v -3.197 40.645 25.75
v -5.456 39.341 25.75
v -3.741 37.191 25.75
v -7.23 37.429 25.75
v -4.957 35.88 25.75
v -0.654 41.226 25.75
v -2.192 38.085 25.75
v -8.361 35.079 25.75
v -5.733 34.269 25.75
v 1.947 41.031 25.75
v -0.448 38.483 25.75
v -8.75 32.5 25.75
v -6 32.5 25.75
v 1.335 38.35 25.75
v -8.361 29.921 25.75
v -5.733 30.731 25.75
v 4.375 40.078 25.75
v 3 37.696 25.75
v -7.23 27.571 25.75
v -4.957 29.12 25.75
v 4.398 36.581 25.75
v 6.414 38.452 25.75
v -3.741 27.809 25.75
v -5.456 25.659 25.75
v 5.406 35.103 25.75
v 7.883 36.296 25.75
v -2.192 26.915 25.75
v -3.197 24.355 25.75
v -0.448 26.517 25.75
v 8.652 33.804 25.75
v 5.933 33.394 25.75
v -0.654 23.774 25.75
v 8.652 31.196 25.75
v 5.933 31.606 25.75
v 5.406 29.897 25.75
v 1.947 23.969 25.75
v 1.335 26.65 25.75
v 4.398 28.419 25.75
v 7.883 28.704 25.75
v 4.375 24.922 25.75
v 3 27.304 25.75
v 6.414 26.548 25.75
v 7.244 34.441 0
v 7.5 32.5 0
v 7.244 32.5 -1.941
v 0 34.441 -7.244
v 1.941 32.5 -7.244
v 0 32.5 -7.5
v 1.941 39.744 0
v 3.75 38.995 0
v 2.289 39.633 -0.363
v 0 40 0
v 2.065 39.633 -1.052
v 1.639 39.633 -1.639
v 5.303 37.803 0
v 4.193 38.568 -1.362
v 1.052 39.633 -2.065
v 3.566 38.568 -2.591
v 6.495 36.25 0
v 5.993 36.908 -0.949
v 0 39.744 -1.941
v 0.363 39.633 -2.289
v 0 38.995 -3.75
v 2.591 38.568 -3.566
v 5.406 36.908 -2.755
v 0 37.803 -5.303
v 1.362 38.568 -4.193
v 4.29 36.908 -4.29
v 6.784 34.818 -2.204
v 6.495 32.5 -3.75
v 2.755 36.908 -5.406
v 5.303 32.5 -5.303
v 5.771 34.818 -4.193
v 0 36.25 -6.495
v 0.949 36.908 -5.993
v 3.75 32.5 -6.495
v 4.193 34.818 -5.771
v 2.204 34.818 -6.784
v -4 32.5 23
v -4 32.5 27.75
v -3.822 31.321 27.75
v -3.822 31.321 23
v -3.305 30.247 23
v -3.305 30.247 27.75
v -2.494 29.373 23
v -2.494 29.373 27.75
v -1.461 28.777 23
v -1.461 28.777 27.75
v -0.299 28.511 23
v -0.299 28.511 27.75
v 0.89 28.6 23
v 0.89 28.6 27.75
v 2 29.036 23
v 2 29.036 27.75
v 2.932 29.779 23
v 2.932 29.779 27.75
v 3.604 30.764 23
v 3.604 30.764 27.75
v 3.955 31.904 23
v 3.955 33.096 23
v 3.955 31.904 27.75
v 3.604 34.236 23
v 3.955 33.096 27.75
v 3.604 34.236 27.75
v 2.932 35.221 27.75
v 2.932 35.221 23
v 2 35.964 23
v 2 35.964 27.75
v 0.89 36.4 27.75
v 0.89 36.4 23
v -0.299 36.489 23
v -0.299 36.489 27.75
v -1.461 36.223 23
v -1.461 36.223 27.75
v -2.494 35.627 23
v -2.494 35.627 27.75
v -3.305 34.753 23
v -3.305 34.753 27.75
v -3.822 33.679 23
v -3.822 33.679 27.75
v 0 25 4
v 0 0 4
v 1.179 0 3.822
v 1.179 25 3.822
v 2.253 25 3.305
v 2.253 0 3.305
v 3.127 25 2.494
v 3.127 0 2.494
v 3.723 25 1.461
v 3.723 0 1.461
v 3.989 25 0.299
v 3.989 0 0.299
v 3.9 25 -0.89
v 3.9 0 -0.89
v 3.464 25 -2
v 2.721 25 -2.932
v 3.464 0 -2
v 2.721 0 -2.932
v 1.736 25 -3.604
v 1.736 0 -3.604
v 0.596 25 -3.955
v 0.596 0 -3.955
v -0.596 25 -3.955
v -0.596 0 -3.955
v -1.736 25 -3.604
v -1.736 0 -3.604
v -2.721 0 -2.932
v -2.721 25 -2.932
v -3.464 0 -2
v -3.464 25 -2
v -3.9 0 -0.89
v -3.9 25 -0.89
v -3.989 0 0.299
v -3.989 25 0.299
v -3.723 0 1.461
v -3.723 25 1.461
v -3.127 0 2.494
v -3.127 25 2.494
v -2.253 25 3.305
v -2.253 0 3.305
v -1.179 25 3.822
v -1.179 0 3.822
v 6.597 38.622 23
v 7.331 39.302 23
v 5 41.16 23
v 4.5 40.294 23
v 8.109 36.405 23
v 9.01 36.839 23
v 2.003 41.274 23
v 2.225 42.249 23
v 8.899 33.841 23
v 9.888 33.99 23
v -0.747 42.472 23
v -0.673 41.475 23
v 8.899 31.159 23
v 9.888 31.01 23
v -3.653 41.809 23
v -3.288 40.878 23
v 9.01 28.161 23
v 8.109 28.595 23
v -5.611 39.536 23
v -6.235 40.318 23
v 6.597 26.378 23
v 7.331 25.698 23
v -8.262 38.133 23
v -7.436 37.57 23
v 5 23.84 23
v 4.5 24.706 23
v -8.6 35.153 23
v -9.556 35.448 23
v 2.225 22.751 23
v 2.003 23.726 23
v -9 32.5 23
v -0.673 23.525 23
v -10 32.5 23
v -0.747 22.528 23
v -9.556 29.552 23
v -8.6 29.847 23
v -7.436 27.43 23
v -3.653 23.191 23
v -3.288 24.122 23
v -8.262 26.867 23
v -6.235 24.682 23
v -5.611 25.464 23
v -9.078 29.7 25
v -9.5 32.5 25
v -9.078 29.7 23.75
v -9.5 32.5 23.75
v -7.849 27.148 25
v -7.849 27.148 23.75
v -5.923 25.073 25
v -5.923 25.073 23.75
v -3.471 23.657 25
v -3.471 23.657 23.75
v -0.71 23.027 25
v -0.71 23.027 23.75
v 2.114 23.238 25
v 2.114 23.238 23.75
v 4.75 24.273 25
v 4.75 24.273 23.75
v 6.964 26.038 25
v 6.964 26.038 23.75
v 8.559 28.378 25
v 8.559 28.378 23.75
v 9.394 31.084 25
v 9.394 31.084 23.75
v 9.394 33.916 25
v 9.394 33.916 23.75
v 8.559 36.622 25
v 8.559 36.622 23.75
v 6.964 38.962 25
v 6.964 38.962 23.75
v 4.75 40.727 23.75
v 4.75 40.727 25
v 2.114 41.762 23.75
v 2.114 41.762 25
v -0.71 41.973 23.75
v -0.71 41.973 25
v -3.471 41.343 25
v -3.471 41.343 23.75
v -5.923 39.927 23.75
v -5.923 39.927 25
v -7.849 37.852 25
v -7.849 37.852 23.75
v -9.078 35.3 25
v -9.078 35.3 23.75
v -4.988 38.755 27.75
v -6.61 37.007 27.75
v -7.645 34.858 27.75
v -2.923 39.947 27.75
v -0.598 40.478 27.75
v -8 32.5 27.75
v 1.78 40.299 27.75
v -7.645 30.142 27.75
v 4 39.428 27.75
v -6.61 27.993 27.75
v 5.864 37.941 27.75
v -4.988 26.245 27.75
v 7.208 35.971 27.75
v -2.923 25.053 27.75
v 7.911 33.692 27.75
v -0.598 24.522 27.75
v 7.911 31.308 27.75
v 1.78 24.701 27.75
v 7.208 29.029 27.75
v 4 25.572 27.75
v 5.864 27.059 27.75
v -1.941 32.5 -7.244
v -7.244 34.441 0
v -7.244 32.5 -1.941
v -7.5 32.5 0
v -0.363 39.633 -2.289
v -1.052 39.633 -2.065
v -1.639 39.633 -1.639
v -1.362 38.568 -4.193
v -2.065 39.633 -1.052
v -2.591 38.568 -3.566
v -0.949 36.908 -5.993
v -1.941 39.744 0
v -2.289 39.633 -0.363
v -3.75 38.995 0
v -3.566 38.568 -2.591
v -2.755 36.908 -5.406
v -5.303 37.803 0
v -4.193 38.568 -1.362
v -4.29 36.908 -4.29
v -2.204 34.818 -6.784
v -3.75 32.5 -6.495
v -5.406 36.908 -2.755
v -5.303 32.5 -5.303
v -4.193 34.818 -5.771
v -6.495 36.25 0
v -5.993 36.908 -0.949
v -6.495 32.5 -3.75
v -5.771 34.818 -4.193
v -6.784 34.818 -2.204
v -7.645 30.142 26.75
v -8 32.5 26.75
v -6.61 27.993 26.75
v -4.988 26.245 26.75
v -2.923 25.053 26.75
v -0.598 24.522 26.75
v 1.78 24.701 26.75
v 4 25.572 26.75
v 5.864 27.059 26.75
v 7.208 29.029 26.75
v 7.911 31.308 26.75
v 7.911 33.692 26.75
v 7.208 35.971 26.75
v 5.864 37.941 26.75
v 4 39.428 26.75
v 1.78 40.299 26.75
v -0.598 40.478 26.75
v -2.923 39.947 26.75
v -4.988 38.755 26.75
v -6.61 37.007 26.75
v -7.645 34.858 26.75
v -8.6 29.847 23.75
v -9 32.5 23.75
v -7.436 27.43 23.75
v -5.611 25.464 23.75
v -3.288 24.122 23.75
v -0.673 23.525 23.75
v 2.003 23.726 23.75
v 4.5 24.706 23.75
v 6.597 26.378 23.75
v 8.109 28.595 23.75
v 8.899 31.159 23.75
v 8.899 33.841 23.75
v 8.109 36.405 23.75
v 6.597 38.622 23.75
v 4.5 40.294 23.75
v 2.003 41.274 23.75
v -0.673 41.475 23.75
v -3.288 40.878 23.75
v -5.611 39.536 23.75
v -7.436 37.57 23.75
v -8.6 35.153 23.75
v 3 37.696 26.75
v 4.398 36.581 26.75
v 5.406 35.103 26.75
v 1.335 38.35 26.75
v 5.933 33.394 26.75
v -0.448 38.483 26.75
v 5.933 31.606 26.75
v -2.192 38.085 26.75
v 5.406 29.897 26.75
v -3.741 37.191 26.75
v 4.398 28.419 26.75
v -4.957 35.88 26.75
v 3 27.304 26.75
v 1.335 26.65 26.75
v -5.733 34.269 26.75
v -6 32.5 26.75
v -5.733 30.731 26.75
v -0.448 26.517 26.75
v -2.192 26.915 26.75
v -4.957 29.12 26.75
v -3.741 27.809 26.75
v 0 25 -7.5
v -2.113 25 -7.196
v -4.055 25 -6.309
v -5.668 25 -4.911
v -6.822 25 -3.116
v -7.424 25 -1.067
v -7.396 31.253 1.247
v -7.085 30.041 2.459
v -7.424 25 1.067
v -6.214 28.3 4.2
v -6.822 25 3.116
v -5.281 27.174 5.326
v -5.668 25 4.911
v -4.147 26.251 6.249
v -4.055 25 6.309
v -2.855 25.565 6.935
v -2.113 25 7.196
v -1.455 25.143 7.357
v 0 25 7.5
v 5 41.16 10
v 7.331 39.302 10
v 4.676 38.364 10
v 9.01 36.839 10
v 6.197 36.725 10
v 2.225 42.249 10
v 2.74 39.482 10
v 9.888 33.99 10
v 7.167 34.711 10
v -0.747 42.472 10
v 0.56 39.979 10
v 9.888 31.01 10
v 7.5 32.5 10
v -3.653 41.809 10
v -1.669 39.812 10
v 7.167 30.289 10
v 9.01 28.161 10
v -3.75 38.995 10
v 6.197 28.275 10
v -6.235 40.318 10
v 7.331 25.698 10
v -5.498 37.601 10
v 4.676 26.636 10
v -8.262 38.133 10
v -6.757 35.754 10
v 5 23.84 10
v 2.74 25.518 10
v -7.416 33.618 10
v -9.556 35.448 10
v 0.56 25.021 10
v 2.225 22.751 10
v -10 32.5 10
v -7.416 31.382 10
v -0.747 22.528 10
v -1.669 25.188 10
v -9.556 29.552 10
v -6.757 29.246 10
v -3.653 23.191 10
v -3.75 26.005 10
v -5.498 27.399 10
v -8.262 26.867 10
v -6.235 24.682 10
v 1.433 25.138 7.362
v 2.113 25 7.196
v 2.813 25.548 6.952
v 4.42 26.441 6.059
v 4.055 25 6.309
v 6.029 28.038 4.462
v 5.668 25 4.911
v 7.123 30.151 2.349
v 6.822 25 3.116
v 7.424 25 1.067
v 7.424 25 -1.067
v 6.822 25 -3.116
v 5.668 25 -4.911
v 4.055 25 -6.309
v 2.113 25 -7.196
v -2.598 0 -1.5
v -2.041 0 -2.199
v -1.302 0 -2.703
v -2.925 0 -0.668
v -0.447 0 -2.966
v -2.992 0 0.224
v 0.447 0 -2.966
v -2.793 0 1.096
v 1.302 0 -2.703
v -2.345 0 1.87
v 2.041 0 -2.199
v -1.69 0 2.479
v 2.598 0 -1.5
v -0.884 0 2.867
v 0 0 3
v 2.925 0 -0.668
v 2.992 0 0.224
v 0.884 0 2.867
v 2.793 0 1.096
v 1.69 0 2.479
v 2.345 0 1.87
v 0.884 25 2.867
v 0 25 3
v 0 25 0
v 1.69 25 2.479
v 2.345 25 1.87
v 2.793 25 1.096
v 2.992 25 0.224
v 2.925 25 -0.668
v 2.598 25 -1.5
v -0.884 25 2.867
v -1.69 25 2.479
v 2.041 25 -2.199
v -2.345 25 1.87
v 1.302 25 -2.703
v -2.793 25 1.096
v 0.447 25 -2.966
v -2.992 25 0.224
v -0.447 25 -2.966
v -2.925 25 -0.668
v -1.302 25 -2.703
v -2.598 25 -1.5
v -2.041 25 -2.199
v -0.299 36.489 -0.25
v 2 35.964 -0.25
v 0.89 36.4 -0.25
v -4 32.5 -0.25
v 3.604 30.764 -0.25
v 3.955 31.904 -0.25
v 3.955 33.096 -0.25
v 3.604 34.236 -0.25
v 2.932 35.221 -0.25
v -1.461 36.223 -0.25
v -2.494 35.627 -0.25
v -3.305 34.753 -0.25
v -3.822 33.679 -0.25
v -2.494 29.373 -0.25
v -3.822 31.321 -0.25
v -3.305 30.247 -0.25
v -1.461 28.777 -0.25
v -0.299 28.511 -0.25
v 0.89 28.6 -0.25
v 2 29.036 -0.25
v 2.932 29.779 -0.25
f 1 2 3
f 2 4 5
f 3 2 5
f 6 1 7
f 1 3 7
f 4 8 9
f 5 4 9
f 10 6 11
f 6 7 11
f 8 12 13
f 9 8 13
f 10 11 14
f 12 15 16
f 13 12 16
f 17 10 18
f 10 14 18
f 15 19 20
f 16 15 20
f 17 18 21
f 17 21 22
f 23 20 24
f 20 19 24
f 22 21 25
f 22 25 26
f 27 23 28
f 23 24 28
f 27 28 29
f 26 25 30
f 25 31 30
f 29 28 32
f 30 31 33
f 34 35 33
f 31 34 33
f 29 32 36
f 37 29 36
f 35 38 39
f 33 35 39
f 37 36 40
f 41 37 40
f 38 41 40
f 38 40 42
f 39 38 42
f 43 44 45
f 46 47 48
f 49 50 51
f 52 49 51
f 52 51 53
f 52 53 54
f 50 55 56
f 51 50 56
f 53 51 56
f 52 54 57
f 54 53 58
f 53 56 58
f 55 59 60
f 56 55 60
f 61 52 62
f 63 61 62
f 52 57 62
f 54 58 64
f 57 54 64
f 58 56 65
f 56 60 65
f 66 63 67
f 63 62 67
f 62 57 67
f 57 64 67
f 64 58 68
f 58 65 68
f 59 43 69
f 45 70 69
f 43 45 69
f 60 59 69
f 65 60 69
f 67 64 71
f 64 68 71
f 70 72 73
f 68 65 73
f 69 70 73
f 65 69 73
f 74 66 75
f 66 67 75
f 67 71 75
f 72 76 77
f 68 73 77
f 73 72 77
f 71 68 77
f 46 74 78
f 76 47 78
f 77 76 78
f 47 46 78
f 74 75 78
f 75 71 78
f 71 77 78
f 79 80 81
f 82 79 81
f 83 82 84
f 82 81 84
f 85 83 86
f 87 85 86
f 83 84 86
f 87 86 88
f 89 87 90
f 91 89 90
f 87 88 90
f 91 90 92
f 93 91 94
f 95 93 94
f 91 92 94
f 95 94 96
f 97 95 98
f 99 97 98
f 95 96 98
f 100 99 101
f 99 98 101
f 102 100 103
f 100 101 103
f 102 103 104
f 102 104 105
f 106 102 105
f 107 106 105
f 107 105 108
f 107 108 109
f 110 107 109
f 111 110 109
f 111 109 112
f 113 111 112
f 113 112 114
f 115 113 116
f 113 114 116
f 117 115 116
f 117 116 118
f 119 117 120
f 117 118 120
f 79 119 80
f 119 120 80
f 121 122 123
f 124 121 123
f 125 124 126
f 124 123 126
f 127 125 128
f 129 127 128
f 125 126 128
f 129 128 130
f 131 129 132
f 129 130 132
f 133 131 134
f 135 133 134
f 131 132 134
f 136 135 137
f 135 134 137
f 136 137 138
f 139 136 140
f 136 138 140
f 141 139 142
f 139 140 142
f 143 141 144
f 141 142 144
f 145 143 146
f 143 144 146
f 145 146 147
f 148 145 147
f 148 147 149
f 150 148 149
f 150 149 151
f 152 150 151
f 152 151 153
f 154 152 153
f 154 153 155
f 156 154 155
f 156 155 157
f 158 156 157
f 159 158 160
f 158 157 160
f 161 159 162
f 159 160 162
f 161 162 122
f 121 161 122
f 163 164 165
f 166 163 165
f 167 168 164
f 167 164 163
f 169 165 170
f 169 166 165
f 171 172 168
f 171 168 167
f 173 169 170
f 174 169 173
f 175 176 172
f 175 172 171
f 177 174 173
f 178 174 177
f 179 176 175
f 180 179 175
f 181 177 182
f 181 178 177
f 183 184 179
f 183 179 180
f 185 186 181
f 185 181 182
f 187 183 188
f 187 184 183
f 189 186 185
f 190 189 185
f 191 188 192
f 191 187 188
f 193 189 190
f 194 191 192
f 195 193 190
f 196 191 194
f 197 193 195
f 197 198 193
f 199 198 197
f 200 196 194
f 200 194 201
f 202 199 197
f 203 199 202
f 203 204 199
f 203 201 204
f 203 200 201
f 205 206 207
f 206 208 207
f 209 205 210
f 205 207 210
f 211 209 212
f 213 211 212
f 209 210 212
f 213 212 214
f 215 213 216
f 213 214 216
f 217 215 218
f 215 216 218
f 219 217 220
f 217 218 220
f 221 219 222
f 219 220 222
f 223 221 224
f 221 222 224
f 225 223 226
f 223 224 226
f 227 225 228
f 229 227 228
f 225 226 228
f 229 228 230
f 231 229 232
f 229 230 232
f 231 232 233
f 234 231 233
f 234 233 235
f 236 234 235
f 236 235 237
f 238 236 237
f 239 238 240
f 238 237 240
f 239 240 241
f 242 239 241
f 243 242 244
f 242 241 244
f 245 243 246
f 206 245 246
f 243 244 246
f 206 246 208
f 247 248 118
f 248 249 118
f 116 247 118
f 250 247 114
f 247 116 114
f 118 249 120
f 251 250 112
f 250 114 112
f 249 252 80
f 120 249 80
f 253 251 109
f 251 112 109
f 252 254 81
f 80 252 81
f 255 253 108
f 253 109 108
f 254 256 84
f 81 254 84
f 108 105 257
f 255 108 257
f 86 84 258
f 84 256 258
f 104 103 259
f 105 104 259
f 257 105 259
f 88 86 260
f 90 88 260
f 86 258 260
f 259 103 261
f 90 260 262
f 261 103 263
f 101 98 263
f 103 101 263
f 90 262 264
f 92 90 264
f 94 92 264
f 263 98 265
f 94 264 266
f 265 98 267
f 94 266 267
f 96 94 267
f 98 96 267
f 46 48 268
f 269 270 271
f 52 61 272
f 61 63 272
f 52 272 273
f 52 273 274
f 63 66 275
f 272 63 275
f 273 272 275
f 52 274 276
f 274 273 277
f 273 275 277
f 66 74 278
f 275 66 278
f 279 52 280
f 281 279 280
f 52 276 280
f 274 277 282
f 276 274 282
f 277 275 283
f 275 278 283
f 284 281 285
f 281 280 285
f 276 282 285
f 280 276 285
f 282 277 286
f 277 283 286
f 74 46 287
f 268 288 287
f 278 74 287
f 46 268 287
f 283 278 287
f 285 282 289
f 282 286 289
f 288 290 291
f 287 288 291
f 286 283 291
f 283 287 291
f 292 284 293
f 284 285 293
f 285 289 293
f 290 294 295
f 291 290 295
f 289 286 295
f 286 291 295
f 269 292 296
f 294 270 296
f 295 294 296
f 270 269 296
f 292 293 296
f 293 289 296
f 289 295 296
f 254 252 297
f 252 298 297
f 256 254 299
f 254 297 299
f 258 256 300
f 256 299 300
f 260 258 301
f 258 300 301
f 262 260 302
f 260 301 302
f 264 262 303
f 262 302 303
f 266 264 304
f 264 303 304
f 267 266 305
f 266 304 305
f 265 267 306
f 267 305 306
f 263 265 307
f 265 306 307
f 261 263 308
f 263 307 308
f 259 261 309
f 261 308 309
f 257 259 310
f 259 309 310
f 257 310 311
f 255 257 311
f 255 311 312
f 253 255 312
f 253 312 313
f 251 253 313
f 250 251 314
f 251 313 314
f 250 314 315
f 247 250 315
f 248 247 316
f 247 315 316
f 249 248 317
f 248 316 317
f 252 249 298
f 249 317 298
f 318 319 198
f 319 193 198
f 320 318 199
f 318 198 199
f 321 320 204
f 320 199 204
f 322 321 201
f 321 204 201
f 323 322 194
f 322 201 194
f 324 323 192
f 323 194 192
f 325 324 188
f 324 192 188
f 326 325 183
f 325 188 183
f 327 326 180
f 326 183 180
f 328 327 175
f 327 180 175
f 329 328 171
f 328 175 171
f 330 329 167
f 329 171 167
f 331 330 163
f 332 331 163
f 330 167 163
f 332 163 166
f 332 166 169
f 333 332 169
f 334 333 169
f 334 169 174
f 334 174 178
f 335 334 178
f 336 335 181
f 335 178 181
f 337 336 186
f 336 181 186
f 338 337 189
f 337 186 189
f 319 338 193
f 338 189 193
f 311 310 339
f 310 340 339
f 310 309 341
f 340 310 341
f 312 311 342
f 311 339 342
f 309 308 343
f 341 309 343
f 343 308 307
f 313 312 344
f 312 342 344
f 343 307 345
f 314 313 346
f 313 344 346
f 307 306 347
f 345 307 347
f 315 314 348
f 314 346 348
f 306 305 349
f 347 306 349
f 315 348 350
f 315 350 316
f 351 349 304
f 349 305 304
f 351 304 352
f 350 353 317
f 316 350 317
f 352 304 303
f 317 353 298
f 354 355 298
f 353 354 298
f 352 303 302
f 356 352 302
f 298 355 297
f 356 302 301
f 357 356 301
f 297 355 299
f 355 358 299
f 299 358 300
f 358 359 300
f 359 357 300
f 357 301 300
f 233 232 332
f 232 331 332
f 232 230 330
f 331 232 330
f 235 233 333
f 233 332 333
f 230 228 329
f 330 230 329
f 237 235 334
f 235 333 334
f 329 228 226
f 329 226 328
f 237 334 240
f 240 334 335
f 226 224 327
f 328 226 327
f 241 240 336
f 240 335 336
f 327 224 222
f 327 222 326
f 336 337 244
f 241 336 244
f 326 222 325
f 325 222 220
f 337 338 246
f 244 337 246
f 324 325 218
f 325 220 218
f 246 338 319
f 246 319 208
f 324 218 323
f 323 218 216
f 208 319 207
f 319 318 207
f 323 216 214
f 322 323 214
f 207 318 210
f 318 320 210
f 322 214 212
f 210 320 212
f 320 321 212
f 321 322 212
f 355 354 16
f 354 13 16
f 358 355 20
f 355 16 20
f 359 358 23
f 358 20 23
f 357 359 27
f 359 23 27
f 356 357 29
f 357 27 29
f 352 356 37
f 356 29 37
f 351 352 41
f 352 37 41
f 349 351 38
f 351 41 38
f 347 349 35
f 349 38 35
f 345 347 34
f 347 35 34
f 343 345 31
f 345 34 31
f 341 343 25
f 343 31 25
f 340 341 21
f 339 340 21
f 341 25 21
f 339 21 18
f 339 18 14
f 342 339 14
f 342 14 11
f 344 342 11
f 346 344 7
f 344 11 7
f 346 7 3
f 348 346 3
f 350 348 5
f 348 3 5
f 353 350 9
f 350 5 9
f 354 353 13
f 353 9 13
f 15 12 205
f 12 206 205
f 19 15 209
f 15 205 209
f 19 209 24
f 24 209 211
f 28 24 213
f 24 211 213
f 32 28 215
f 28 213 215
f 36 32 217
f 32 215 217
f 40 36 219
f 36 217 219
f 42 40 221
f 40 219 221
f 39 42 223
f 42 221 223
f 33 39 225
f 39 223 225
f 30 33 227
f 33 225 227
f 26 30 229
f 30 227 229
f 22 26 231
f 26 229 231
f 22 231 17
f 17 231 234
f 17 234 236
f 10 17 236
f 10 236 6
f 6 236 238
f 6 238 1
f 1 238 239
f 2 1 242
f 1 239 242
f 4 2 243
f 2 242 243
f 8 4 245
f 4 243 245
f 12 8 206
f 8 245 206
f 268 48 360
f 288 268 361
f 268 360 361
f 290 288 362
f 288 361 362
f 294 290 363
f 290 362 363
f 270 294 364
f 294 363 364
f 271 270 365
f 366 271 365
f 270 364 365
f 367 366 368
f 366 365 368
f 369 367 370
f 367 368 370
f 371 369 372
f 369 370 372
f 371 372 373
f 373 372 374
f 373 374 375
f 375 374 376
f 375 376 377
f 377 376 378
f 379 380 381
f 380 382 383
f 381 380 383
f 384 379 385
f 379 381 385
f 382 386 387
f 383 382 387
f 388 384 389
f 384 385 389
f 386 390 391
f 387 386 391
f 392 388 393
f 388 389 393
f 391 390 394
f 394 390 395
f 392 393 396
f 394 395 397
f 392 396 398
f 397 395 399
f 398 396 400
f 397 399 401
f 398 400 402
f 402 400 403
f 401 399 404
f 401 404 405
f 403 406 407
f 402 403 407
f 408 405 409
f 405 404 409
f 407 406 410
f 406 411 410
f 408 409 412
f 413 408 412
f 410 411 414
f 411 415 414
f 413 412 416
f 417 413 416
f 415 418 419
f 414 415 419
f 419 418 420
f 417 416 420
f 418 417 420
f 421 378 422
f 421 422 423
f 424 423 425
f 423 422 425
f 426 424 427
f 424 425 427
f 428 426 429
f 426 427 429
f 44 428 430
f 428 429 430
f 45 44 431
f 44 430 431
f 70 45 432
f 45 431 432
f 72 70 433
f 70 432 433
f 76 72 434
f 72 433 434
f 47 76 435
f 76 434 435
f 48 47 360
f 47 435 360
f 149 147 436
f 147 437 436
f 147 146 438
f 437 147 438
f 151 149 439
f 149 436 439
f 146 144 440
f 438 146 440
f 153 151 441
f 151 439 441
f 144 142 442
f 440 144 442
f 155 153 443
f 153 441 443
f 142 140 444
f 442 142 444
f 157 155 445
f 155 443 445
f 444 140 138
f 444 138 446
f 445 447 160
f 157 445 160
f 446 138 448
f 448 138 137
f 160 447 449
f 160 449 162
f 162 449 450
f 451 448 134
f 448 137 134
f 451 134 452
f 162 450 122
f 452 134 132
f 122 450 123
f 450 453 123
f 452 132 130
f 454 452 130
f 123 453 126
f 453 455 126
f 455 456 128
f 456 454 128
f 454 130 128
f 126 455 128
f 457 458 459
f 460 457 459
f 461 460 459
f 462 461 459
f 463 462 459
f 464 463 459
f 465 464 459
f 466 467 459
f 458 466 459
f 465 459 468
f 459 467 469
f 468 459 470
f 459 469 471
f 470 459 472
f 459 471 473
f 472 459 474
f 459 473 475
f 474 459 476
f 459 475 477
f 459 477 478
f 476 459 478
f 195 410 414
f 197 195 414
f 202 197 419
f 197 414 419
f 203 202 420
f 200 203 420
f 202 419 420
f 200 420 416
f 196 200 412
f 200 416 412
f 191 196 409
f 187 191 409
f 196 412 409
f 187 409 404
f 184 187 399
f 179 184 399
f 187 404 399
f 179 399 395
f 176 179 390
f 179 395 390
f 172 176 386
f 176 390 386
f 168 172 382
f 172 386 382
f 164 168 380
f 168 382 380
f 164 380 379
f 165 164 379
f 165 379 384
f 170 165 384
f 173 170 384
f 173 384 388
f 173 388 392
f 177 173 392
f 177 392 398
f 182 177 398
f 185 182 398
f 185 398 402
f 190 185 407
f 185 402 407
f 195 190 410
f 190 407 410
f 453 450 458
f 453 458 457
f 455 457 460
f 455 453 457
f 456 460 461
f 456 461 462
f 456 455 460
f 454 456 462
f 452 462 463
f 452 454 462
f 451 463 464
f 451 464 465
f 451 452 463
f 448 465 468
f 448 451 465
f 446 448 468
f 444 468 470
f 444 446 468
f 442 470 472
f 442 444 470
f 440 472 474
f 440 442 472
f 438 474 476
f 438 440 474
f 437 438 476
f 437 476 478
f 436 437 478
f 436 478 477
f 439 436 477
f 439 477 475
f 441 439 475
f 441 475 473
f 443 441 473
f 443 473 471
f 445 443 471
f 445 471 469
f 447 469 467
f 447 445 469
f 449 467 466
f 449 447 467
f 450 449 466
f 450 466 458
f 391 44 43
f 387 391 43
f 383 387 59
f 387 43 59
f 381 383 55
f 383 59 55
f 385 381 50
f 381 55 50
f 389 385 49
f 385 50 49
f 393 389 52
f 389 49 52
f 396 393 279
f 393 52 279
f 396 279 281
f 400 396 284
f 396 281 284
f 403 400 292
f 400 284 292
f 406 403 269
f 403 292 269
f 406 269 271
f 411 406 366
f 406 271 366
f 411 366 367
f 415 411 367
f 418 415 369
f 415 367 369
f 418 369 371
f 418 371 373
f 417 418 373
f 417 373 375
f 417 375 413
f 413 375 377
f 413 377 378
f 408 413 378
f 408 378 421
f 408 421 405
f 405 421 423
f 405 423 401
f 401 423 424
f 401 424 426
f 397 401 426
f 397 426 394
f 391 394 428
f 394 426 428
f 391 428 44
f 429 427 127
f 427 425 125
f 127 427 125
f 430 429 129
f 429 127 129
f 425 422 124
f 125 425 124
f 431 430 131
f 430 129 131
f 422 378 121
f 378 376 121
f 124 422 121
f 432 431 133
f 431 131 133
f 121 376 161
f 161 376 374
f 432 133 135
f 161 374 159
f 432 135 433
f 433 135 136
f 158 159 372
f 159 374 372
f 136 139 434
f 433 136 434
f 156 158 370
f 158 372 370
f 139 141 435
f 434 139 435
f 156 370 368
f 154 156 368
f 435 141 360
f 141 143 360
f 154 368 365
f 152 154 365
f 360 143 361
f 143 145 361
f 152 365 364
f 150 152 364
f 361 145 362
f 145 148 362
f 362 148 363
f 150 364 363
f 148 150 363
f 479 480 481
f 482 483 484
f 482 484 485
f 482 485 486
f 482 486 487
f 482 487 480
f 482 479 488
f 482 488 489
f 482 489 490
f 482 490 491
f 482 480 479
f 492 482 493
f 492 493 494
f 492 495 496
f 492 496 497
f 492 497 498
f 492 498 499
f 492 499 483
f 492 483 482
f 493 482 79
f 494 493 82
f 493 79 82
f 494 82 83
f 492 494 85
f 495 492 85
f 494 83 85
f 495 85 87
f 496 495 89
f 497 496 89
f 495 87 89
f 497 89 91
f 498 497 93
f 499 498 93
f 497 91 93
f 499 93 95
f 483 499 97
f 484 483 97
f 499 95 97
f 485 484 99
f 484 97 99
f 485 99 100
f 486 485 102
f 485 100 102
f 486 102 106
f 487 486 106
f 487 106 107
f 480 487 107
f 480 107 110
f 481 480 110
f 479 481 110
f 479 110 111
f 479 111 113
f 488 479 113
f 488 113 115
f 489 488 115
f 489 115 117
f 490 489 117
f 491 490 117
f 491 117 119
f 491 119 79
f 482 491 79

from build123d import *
from build123d.topology import SkipClean

# Parameters (mm, degrees)
SKETCH_1_R          = 4
SKETCH_1_R_2        = 3
EXTRUDE_1_DEPTH     = 25
SKETCH_3_R          = 7.5
EXTRUDE_2_DEPTH     = 10
SKETCH_4_R          = 10
EXTRUDE_3_DEPTH     = 13
SKETCH_6_R          = 4
CUT_EXTRUDE_1_DEPTH = 28


with BuildPart() as part:
    # Эскиз1 → Бобышка-Вытянуть1 (new body)
    with BuildSketch(Plane(origin=(0, 0, 0), x_dir=(1, 0, 0), z_dir=(0, 1, 0))):
        with Locations(Location((0, 0, 0), (0, 0, 270))):
            Circle(SKETCH_1_R)
        with Locations(Location((0, 0, 0), (0, 0, 270))):
            Circle(SKETCH_1_R_2, mode=Mode.SUBTRACT)
    extrude(amount=EXTRUDE_1_DEPTH)

    # Эскиз2 → Повернуть1 (revolve)
    with BuildSketch(Plane.XY, mode=Mode.PRIVATE) as revolve_1_sk:
        with BuildLine():
            Line((0, 25), (0, 40))
            ThreePointArc((0, 40), (5.303300859, 37.803300859), (7.5, 32.5))
            Line((7.5, 32.5), (7.5, 25))
            Line((7.5, 25), (0, 25))
        make_face()
    revolve(revolve_1_sk.sketch.rotate(Axis((0, 25, 0), (0, 1, 0)), 90), axis=Axis((0, 25, 0), (0, 1, 0)))

    # Эскиз3 → Бобышка-Вытянуть2 (add)
    with SkipClean():  # the faces are left unmerged after this step: merging them gives an invalid solid
        with BuildSketch(Plane.XY):
            with Locations((0, 32.5)):
                Circle(SKETCH_3_R)
        extrude(amount=EXTRUDE_2_DEPTH)

    # Эскиз4 → Бобышка-Вытянуть3 (add)
    with SkipClean():  # the faces are left unmerged after this step: merging them gives an invalid solid
        with BuildSketch(Plane.XY.offset(10)):
            with Locations(Location((0, 32.5, 0), (0, 0, 180))):
                Circle(SKETCH_4_R)
        extrude(amount=EXTRUDE_3_DEPTH)

    # Эскиз5 → Повернуть3 (revolve)
    with SkipClean():  # the faces are left unmerged after this step: merging them gives an invalid solid
        with BuildSketch(Plane(origin=(0, 0, 0), x_dir=(0, 0, -1), z_dir=(1, 0, 0)), mode=Mode.PRIVATE) as revolve_3_sk:
            Polygon((-26.75, 24.5), (-26.75, 26.5), (-25.75, 26.5), (-25.75, 23.75), (-25, 23), (-23.75, 23), (-23.75, 23.5), (-23, 23.5), (-23, 28.5), (-27.75, 28.5), (-27.75, 24.5), align=None)
        revolve(revolve_3_sk.sketch.rotate(Axis((0, 32.5, 23), (0, 0, 1)), 270), axis=Axis((0, 32.5, 23), (0, 0, 1)))

    # Эскиз6 → Вырез-Вытянуть1 (cut)
    with SkipClean():  # the faces are left unmerged after this step: merging them gives an invalid solid
        with BuildSketch(Plane.XY.offset(27.75)):
            with Locations(Location((0, 32.5, 0), (0, 0, 180))):
                Circle(SKETCH_6_R)
        extrude(amount=-CUT_EXTRUDE_1_DEPTH, mode=Mode.SUBTRACT)


solid = part.part
